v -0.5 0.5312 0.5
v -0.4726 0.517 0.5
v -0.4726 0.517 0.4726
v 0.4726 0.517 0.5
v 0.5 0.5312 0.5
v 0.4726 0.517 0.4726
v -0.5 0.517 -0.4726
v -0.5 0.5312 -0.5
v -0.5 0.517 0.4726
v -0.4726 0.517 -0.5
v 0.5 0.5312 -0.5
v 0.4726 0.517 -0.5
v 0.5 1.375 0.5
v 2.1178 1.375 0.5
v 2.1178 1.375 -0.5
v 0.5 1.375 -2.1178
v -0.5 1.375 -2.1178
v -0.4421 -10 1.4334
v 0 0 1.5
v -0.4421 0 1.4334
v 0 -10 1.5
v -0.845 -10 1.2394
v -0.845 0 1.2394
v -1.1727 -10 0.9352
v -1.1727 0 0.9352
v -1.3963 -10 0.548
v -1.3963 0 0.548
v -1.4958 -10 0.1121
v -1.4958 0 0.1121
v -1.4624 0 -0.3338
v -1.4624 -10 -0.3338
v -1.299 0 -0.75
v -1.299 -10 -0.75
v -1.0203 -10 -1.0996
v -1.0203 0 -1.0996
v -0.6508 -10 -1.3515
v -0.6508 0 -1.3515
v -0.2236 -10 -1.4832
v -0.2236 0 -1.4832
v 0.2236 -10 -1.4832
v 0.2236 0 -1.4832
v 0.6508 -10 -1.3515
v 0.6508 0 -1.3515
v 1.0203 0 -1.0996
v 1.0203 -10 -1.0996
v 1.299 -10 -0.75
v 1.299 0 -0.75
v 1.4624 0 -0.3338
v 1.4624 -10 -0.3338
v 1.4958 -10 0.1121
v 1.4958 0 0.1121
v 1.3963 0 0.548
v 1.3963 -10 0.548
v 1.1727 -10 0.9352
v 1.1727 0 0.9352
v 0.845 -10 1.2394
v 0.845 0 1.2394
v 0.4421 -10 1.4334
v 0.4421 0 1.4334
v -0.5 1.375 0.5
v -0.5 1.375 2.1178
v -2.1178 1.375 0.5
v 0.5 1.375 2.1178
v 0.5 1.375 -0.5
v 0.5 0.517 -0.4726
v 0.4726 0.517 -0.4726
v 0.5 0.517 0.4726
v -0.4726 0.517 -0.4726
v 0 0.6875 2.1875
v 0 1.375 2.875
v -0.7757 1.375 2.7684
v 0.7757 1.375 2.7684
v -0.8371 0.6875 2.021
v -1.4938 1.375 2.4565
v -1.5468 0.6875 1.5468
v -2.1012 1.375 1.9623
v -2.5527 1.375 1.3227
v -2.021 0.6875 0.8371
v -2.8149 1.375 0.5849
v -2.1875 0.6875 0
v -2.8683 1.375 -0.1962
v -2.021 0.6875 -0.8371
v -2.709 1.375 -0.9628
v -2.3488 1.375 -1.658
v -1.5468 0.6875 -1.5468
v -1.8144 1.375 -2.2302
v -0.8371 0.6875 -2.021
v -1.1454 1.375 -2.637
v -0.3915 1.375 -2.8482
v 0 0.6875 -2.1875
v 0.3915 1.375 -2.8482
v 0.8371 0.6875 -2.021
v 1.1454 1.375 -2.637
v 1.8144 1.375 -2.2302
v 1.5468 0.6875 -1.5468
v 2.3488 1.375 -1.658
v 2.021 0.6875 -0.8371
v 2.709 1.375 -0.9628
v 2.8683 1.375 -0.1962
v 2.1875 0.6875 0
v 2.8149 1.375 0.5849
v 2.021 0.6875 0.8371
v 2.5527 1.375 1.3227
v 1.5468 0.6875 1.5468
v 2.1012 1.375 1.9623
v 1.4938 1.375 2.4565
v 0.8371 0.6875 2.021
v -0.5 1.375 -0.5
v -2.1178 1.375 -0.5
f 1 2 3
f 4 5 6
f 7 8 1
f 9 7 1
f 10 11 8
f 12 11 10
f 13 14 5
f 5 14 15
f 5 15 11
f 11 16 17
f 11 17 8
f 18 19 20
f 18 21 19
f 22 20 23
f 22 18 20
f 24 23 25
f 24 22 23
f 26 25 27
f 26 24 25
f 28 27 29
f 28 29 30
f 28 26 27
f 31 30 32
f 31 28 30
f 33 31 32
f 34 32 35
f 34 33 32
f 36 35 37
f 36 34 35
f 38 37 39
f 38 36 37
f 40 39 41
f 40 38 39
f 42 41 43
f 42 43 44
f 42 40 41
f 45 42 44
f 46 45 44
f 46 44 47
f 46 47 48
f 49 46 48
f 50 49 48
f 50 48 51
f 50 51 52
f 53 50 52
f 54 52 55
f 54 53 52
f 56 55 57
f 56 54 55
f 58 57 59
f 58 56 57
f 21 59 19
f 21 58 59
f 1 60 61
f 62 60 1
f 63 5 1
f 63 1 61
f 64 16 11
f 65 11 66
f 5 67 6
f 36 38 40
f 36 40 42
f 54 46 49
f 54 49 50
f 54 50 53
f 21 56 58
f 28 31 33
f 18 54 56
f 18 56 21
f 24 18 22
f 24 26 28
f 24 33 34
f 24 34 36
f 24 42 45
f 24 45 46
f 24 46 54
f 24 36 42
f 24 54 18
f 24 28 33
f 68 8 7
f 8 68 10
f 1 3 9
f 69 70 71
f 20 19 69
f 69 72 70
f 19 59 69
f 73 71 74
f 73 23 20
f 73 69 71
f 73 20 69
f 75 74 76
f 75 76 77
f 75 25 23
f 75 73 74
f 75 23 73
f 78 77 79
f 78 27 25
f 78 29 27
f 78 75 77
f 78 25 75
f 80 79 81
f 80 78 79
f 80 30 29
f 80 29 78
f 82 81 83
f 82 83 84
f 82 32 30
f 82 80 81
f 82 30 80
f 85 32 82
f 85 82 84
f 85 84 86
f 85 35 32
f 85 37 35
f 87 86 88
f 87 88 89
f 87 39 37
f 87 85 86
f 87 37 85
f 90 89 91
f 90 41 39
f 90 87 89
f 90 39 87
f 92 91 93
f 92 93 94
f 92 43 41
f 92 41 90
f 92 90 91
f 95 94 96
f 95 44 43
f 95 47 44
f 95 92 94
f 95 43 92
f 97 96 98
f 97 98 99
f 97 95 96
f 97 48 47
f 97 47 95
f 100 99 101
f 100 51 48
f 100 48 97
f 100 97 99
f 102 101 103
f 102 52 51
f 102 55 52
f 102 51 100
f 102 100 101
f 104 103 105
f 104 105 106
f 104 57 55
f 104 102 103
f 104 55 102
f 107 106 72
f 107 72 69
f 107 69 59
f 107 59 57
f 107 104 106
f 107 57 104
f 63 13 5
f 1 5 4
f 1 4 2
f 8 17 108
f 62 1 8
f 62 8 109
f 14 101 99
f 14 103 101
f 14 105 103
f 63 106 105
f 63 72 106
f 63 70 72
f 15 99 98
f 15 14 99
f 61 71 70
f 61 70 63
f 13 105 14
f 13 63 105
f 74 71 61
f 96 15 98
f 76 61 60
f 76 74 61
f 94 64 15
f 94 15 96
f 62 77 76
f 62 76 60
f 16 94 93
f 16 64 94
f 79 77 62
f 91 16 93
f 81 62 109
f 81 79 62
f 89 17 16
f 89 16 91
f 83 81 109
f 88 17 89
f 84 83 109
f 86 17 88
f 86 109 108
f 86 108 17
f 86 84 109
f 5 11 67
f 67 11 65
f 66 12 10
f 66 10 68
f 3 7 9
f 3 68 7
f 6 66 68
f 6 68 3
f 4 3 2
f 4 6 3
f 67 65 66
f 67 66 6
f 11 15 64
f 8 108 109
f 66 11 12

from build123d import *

# Parameters (mm, degrees)
CUT_EXTRUDE1_DEPTH = 0.5
CIRPATTERN1_COUNT  = 4


with BuildPart() as part:
    # Sketch1 → Revolve1 (revolve)
    with BuildSketch(Plane.XY):
        Polygon((-1.5, 0), (-1.5, -10), (0, -10), (0, 1.375), (-2.875, 1.375), align=None)
    revolve(axis=Axis((0, 0, 0), (0, -1, 0)))

    # Sketch2 → Cut-Extrude1 (cut, symmetric)
    with BuildSketch(Plane.XY):
        Polygon((-2.11777299, 1.375), (2.11777299, 1.375), (0.472629215, 0.516963183), (-0.472629215, 0.516963183), align=None)
    cut_extrude1 = extrude(amount=CUT_EXTRUDE1_DEPTH, both=True, mode=Mode.SUBTRACT)

    # CirPattern1: Cut-Extrude1 ×4 about axis
    cirpattern1_axis = Axis((0, 0, 0), (0, 1, 0))
    for i in range(1, CIRPATTERN1_COUNT):
        add(cut_extrude1.rotate(cirpattern1_axis, i * 360 / CIRPATTERN1_COUNT), mode=Mode.SUBTRACT)


solid = part.part
